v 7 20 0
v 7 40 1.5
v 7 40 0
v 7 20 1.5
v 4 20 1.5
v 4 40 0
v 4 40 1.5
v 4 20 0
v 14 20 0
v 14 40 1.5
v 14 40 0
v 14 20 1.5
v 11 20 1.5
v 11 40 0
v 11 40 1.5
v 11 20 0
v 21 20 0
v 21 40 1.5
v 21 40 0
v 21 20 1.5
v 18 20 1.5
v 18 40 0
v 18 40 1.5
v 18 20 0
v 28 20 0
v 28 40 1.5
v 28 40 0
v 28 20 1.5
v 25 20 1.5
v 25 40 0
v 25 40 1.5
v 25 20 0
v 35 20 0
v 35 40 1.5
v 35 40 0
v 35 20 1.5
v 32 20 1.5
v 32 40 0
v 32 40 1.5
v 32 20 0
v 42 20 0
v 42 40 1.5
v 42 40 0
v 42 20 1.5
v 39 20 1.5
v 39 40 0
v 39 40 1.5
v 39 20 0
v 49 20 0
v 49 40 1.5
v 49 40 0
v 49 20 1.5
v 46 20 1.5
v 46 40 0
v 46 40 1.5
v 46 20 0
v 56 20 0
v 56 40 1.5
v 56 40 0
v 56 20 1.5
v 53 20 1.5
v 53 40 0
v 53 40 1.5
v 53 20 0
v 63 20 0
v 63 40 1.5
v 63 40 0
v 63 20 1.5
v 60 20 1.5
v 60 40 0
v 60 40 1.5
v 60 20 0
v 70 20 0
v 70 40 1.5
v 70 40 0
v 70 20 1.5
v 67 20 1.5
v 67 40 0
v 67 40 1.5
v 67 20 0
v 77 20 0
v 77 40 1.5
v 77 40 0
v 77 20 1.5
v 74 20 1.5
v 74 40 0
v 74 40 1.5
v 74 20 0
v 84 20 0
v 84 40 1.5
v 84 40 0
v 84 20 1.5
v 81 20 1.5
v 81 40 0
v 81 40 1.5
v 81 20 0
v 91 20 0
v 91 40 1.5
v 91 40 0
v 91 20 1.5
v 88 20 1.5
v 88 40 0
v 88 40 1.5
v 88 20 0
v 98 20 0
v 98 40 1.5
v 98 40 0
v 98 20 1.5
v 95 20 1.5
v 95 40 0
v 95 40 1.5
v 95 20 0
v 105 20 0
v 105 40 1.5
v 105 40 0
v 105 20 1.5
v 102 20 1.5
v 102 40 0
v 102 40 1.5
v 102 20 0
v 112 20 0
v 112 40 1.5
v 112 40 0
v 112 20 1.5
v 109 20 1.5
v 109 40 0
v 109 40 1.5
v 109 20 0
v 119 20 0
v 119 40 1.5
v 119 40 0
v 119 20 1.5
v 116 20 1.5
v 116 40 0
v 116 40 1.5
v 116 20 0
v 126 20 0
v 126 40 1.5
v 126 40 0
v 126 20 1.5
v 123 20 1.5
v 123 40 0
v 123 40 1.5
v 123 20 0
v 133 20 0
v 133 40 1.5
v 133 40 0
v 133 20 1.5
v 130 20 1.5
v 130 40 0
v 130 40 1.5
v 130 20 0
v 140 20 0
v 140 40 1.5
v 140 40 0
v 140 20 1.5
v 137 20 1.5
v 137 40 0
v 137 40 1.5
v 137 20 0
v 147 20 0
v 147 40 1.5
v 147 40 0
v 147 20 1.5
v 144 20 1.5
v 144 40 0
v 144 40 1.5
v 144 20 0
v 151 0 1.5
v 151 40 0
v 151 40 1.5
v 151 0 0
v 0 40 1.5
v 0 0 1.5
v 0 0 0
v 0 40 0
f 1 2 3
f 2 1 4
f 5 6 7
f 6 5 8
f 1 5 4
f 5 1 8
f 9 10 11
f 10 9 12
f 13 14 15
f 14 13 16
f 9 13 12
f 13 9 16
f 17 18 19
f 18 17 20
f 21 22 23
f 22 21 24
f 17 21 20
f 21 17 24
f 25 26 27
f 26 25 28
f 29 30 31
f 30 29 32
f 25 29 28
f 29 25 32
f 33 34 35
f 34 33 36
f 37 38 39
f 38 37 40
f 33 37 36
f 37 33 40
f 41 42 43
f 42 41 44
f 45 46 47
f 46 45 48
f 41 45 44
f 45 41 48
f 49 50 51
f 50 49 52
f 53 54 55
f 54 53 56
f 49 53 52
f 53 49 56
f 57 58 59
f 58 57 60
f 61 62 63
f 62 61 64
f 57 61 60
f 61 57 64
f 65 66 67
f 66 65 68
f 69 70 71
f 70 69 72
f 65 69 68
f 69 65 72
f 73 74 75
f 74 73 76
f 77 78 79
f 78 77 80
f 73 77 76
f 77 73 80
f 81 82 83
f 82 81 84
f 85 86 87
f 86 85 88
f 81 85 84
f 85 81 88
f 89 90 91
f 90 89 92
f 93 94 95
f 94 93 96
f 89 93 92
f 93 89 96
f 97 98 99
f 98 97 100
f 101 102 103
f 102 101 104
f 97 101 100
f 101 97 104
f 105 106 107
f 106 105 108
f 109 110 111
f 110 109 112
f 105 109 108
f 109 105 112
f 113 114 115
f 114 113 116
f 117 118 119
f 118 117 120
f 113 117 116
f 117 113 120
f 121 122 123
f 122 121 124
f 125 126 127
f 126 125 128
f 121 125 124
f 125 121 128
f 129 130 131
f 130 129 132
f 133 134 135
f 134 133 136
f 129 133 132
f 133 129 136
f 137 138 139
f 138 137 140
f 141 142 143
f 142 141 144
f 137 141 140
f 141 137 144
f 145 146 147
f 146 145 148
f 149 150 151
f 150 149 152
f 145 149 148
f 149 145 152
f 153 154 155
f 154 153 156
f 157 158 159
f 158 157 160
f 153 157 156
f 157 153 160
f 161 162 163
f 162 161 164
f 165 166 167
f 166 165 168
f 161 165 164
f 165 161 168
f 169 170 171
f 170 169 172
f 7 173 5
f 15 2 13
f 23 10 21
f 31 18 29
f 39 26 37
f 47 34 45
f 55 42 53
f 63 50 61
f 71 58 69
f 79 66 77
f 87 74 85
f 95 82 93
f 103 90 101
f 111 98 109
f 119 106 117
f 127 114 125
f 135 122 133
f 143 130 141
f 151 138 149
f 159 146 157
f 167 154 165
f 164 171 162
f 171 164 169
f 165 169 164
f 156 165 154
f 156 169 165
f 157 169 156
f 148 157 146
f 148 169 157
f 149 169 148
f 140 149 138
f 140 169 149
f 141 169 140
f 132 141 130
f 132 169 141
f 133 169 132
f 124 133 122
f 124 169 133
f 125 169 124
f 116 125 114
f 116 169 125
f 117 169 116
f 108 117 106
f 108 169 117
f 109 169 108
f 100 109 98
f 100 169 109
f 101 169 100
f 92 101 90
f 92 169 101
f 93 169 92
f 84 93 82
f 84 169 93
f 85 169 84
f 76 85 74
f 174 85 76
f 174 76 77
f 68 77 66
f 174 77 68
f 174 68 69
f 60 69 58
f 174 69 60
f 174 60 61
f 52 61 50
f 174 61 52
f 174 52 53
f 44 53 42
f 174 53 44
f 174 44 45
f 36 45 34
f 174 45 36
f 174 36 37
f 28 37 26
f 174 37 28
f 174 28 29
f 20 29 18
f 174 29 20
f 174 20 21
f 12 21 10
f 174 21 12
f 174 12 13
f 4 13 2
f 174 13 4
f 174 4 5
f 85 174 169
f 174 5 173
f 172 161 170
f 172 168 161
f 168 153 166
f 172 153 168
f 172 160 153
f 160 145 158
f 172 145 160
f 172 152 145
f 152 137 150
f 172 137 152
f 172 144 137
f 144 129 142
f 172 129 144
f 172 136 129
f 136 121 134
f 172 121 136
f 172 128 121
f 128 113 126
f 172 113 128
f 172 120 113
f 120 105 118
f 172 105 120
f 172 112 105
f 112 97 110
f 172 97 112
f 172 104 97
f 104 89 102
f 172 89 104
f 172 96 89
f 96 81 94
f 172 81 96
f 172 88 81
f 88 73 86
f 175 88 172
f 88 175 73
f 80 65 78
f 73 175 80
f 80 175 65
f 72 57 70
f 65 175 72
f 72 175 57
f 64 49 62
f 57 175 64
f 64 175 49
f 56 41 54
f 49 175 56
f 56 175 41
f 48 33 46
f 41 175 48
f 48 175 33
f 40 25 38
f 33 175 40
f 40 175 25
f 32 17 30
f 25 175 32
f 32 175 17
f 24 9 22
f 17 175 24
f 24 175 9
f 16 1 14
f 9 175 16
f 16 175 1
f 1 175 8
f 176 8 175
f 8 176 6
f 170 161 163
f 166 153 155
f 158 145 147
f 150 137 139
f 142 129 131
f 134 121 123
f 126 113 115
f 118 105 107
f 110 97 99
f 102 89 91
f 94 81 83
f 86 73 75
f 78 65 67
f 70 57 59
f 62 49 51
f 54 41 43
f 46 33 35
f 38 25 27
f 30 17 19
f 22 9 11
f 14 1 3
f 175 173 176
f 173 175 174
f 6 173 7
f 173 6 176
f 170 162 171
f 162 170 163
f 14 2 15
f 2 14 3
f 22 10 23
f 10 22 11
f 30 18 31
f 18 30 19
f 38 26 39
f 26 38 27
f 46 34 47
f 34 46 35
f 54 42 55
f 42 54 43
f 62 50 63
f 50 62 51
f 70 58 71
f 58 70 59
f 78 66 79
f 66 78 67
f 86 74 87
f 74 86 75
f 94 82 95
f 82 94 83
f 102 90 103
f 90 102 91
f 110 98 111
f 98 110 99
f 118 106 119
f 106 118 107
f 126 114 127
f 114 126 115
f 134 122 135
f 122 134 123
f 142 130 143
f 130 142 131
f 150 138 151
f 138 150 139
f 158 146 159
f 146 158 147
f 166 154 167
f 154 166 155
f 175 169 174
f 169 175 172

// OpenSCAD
copperZ = 0.85; // depth of copper indentation
copperX = 12.72+0.06;  // 12.72mm + 0.06
copperY = 27.88+0.52;  // 27.88mm + 0.52
copperTrayY = copperY + 4; // width of copper tray
copperTrayZ = 3; // thickness of copper tray
copperCount = 8;  // how many we'll tray for

difference() {
  color("mediumblue") cube([151,40,1.5]);  // the comb
  for ( a = [4 : 7 : 146] ) {   // for each cutout
    translate([a,20,-0.1]) color("white") cube([3,40,2]); // cutout for the copper slab itself
    }
  /*for ( a = [4 : copperX+2 : copperCount*(copperX+2)+1] ) {   // for each copperslab
    translate([a,(copperTrayY-copperY)/2,copperTrayZ-copperZ]){
      cube([copperX,copperY,copperZ+0.1]); // cutout for the copper slab itself
      translate([copperX,0,copperZ-(copperZ*0.5)]){
        cube (size = [1.2,1.2,copperZ*3], center = true);  // one of four corners
      }
      translate([copperX,copperY,copperZ-(copperZ*0.5)]){
        cube (size = [1.2,1.2,copperZ*3], center = true);
      }
      translate([0,0,copperZ-(copperZ*0.5)]){
        cube (size = [1.2,1.2,copperZ*3], center = true);
      }
      translate([0,copperY,copperZ-(copperZ*0.5)]){
        cube (size = [1.2,1.2,copperZ*3], center = true);
      }
      translate([0,copperY*0.5,0]){
        rotate(a = [90,0,0]) { // rotate around x axis
          cylinder (h = copperY+0.2, r = copperZ-0.4, center = true, $fs=50);
        }
      }
      translate([copperX,copperY*0.5,0]){
        rotate(a = [90,0,0]) { // rotate around x axis
          cylinder (h = copperY+0.2, r = copperZ-0.4, center = true, $fs=50);
        }
      }
      translate([copperX*0.5,0,0]){
        rotate(a = [0,90,0]) { // rotate around y axis
          cylinder (h = copperX+0.2, r = copperZ-0.4, center = true, $fs=50);
        }
      }
      translate([copperX*0.5,copperY,0]){
        rotate(a = [0,90,0]) { // rotate around y axis
          cylinder (h = copperX+0.2, r = copperZ-0.4, center = true, $fs=50);
        }
      }
    }
  }*/
}
